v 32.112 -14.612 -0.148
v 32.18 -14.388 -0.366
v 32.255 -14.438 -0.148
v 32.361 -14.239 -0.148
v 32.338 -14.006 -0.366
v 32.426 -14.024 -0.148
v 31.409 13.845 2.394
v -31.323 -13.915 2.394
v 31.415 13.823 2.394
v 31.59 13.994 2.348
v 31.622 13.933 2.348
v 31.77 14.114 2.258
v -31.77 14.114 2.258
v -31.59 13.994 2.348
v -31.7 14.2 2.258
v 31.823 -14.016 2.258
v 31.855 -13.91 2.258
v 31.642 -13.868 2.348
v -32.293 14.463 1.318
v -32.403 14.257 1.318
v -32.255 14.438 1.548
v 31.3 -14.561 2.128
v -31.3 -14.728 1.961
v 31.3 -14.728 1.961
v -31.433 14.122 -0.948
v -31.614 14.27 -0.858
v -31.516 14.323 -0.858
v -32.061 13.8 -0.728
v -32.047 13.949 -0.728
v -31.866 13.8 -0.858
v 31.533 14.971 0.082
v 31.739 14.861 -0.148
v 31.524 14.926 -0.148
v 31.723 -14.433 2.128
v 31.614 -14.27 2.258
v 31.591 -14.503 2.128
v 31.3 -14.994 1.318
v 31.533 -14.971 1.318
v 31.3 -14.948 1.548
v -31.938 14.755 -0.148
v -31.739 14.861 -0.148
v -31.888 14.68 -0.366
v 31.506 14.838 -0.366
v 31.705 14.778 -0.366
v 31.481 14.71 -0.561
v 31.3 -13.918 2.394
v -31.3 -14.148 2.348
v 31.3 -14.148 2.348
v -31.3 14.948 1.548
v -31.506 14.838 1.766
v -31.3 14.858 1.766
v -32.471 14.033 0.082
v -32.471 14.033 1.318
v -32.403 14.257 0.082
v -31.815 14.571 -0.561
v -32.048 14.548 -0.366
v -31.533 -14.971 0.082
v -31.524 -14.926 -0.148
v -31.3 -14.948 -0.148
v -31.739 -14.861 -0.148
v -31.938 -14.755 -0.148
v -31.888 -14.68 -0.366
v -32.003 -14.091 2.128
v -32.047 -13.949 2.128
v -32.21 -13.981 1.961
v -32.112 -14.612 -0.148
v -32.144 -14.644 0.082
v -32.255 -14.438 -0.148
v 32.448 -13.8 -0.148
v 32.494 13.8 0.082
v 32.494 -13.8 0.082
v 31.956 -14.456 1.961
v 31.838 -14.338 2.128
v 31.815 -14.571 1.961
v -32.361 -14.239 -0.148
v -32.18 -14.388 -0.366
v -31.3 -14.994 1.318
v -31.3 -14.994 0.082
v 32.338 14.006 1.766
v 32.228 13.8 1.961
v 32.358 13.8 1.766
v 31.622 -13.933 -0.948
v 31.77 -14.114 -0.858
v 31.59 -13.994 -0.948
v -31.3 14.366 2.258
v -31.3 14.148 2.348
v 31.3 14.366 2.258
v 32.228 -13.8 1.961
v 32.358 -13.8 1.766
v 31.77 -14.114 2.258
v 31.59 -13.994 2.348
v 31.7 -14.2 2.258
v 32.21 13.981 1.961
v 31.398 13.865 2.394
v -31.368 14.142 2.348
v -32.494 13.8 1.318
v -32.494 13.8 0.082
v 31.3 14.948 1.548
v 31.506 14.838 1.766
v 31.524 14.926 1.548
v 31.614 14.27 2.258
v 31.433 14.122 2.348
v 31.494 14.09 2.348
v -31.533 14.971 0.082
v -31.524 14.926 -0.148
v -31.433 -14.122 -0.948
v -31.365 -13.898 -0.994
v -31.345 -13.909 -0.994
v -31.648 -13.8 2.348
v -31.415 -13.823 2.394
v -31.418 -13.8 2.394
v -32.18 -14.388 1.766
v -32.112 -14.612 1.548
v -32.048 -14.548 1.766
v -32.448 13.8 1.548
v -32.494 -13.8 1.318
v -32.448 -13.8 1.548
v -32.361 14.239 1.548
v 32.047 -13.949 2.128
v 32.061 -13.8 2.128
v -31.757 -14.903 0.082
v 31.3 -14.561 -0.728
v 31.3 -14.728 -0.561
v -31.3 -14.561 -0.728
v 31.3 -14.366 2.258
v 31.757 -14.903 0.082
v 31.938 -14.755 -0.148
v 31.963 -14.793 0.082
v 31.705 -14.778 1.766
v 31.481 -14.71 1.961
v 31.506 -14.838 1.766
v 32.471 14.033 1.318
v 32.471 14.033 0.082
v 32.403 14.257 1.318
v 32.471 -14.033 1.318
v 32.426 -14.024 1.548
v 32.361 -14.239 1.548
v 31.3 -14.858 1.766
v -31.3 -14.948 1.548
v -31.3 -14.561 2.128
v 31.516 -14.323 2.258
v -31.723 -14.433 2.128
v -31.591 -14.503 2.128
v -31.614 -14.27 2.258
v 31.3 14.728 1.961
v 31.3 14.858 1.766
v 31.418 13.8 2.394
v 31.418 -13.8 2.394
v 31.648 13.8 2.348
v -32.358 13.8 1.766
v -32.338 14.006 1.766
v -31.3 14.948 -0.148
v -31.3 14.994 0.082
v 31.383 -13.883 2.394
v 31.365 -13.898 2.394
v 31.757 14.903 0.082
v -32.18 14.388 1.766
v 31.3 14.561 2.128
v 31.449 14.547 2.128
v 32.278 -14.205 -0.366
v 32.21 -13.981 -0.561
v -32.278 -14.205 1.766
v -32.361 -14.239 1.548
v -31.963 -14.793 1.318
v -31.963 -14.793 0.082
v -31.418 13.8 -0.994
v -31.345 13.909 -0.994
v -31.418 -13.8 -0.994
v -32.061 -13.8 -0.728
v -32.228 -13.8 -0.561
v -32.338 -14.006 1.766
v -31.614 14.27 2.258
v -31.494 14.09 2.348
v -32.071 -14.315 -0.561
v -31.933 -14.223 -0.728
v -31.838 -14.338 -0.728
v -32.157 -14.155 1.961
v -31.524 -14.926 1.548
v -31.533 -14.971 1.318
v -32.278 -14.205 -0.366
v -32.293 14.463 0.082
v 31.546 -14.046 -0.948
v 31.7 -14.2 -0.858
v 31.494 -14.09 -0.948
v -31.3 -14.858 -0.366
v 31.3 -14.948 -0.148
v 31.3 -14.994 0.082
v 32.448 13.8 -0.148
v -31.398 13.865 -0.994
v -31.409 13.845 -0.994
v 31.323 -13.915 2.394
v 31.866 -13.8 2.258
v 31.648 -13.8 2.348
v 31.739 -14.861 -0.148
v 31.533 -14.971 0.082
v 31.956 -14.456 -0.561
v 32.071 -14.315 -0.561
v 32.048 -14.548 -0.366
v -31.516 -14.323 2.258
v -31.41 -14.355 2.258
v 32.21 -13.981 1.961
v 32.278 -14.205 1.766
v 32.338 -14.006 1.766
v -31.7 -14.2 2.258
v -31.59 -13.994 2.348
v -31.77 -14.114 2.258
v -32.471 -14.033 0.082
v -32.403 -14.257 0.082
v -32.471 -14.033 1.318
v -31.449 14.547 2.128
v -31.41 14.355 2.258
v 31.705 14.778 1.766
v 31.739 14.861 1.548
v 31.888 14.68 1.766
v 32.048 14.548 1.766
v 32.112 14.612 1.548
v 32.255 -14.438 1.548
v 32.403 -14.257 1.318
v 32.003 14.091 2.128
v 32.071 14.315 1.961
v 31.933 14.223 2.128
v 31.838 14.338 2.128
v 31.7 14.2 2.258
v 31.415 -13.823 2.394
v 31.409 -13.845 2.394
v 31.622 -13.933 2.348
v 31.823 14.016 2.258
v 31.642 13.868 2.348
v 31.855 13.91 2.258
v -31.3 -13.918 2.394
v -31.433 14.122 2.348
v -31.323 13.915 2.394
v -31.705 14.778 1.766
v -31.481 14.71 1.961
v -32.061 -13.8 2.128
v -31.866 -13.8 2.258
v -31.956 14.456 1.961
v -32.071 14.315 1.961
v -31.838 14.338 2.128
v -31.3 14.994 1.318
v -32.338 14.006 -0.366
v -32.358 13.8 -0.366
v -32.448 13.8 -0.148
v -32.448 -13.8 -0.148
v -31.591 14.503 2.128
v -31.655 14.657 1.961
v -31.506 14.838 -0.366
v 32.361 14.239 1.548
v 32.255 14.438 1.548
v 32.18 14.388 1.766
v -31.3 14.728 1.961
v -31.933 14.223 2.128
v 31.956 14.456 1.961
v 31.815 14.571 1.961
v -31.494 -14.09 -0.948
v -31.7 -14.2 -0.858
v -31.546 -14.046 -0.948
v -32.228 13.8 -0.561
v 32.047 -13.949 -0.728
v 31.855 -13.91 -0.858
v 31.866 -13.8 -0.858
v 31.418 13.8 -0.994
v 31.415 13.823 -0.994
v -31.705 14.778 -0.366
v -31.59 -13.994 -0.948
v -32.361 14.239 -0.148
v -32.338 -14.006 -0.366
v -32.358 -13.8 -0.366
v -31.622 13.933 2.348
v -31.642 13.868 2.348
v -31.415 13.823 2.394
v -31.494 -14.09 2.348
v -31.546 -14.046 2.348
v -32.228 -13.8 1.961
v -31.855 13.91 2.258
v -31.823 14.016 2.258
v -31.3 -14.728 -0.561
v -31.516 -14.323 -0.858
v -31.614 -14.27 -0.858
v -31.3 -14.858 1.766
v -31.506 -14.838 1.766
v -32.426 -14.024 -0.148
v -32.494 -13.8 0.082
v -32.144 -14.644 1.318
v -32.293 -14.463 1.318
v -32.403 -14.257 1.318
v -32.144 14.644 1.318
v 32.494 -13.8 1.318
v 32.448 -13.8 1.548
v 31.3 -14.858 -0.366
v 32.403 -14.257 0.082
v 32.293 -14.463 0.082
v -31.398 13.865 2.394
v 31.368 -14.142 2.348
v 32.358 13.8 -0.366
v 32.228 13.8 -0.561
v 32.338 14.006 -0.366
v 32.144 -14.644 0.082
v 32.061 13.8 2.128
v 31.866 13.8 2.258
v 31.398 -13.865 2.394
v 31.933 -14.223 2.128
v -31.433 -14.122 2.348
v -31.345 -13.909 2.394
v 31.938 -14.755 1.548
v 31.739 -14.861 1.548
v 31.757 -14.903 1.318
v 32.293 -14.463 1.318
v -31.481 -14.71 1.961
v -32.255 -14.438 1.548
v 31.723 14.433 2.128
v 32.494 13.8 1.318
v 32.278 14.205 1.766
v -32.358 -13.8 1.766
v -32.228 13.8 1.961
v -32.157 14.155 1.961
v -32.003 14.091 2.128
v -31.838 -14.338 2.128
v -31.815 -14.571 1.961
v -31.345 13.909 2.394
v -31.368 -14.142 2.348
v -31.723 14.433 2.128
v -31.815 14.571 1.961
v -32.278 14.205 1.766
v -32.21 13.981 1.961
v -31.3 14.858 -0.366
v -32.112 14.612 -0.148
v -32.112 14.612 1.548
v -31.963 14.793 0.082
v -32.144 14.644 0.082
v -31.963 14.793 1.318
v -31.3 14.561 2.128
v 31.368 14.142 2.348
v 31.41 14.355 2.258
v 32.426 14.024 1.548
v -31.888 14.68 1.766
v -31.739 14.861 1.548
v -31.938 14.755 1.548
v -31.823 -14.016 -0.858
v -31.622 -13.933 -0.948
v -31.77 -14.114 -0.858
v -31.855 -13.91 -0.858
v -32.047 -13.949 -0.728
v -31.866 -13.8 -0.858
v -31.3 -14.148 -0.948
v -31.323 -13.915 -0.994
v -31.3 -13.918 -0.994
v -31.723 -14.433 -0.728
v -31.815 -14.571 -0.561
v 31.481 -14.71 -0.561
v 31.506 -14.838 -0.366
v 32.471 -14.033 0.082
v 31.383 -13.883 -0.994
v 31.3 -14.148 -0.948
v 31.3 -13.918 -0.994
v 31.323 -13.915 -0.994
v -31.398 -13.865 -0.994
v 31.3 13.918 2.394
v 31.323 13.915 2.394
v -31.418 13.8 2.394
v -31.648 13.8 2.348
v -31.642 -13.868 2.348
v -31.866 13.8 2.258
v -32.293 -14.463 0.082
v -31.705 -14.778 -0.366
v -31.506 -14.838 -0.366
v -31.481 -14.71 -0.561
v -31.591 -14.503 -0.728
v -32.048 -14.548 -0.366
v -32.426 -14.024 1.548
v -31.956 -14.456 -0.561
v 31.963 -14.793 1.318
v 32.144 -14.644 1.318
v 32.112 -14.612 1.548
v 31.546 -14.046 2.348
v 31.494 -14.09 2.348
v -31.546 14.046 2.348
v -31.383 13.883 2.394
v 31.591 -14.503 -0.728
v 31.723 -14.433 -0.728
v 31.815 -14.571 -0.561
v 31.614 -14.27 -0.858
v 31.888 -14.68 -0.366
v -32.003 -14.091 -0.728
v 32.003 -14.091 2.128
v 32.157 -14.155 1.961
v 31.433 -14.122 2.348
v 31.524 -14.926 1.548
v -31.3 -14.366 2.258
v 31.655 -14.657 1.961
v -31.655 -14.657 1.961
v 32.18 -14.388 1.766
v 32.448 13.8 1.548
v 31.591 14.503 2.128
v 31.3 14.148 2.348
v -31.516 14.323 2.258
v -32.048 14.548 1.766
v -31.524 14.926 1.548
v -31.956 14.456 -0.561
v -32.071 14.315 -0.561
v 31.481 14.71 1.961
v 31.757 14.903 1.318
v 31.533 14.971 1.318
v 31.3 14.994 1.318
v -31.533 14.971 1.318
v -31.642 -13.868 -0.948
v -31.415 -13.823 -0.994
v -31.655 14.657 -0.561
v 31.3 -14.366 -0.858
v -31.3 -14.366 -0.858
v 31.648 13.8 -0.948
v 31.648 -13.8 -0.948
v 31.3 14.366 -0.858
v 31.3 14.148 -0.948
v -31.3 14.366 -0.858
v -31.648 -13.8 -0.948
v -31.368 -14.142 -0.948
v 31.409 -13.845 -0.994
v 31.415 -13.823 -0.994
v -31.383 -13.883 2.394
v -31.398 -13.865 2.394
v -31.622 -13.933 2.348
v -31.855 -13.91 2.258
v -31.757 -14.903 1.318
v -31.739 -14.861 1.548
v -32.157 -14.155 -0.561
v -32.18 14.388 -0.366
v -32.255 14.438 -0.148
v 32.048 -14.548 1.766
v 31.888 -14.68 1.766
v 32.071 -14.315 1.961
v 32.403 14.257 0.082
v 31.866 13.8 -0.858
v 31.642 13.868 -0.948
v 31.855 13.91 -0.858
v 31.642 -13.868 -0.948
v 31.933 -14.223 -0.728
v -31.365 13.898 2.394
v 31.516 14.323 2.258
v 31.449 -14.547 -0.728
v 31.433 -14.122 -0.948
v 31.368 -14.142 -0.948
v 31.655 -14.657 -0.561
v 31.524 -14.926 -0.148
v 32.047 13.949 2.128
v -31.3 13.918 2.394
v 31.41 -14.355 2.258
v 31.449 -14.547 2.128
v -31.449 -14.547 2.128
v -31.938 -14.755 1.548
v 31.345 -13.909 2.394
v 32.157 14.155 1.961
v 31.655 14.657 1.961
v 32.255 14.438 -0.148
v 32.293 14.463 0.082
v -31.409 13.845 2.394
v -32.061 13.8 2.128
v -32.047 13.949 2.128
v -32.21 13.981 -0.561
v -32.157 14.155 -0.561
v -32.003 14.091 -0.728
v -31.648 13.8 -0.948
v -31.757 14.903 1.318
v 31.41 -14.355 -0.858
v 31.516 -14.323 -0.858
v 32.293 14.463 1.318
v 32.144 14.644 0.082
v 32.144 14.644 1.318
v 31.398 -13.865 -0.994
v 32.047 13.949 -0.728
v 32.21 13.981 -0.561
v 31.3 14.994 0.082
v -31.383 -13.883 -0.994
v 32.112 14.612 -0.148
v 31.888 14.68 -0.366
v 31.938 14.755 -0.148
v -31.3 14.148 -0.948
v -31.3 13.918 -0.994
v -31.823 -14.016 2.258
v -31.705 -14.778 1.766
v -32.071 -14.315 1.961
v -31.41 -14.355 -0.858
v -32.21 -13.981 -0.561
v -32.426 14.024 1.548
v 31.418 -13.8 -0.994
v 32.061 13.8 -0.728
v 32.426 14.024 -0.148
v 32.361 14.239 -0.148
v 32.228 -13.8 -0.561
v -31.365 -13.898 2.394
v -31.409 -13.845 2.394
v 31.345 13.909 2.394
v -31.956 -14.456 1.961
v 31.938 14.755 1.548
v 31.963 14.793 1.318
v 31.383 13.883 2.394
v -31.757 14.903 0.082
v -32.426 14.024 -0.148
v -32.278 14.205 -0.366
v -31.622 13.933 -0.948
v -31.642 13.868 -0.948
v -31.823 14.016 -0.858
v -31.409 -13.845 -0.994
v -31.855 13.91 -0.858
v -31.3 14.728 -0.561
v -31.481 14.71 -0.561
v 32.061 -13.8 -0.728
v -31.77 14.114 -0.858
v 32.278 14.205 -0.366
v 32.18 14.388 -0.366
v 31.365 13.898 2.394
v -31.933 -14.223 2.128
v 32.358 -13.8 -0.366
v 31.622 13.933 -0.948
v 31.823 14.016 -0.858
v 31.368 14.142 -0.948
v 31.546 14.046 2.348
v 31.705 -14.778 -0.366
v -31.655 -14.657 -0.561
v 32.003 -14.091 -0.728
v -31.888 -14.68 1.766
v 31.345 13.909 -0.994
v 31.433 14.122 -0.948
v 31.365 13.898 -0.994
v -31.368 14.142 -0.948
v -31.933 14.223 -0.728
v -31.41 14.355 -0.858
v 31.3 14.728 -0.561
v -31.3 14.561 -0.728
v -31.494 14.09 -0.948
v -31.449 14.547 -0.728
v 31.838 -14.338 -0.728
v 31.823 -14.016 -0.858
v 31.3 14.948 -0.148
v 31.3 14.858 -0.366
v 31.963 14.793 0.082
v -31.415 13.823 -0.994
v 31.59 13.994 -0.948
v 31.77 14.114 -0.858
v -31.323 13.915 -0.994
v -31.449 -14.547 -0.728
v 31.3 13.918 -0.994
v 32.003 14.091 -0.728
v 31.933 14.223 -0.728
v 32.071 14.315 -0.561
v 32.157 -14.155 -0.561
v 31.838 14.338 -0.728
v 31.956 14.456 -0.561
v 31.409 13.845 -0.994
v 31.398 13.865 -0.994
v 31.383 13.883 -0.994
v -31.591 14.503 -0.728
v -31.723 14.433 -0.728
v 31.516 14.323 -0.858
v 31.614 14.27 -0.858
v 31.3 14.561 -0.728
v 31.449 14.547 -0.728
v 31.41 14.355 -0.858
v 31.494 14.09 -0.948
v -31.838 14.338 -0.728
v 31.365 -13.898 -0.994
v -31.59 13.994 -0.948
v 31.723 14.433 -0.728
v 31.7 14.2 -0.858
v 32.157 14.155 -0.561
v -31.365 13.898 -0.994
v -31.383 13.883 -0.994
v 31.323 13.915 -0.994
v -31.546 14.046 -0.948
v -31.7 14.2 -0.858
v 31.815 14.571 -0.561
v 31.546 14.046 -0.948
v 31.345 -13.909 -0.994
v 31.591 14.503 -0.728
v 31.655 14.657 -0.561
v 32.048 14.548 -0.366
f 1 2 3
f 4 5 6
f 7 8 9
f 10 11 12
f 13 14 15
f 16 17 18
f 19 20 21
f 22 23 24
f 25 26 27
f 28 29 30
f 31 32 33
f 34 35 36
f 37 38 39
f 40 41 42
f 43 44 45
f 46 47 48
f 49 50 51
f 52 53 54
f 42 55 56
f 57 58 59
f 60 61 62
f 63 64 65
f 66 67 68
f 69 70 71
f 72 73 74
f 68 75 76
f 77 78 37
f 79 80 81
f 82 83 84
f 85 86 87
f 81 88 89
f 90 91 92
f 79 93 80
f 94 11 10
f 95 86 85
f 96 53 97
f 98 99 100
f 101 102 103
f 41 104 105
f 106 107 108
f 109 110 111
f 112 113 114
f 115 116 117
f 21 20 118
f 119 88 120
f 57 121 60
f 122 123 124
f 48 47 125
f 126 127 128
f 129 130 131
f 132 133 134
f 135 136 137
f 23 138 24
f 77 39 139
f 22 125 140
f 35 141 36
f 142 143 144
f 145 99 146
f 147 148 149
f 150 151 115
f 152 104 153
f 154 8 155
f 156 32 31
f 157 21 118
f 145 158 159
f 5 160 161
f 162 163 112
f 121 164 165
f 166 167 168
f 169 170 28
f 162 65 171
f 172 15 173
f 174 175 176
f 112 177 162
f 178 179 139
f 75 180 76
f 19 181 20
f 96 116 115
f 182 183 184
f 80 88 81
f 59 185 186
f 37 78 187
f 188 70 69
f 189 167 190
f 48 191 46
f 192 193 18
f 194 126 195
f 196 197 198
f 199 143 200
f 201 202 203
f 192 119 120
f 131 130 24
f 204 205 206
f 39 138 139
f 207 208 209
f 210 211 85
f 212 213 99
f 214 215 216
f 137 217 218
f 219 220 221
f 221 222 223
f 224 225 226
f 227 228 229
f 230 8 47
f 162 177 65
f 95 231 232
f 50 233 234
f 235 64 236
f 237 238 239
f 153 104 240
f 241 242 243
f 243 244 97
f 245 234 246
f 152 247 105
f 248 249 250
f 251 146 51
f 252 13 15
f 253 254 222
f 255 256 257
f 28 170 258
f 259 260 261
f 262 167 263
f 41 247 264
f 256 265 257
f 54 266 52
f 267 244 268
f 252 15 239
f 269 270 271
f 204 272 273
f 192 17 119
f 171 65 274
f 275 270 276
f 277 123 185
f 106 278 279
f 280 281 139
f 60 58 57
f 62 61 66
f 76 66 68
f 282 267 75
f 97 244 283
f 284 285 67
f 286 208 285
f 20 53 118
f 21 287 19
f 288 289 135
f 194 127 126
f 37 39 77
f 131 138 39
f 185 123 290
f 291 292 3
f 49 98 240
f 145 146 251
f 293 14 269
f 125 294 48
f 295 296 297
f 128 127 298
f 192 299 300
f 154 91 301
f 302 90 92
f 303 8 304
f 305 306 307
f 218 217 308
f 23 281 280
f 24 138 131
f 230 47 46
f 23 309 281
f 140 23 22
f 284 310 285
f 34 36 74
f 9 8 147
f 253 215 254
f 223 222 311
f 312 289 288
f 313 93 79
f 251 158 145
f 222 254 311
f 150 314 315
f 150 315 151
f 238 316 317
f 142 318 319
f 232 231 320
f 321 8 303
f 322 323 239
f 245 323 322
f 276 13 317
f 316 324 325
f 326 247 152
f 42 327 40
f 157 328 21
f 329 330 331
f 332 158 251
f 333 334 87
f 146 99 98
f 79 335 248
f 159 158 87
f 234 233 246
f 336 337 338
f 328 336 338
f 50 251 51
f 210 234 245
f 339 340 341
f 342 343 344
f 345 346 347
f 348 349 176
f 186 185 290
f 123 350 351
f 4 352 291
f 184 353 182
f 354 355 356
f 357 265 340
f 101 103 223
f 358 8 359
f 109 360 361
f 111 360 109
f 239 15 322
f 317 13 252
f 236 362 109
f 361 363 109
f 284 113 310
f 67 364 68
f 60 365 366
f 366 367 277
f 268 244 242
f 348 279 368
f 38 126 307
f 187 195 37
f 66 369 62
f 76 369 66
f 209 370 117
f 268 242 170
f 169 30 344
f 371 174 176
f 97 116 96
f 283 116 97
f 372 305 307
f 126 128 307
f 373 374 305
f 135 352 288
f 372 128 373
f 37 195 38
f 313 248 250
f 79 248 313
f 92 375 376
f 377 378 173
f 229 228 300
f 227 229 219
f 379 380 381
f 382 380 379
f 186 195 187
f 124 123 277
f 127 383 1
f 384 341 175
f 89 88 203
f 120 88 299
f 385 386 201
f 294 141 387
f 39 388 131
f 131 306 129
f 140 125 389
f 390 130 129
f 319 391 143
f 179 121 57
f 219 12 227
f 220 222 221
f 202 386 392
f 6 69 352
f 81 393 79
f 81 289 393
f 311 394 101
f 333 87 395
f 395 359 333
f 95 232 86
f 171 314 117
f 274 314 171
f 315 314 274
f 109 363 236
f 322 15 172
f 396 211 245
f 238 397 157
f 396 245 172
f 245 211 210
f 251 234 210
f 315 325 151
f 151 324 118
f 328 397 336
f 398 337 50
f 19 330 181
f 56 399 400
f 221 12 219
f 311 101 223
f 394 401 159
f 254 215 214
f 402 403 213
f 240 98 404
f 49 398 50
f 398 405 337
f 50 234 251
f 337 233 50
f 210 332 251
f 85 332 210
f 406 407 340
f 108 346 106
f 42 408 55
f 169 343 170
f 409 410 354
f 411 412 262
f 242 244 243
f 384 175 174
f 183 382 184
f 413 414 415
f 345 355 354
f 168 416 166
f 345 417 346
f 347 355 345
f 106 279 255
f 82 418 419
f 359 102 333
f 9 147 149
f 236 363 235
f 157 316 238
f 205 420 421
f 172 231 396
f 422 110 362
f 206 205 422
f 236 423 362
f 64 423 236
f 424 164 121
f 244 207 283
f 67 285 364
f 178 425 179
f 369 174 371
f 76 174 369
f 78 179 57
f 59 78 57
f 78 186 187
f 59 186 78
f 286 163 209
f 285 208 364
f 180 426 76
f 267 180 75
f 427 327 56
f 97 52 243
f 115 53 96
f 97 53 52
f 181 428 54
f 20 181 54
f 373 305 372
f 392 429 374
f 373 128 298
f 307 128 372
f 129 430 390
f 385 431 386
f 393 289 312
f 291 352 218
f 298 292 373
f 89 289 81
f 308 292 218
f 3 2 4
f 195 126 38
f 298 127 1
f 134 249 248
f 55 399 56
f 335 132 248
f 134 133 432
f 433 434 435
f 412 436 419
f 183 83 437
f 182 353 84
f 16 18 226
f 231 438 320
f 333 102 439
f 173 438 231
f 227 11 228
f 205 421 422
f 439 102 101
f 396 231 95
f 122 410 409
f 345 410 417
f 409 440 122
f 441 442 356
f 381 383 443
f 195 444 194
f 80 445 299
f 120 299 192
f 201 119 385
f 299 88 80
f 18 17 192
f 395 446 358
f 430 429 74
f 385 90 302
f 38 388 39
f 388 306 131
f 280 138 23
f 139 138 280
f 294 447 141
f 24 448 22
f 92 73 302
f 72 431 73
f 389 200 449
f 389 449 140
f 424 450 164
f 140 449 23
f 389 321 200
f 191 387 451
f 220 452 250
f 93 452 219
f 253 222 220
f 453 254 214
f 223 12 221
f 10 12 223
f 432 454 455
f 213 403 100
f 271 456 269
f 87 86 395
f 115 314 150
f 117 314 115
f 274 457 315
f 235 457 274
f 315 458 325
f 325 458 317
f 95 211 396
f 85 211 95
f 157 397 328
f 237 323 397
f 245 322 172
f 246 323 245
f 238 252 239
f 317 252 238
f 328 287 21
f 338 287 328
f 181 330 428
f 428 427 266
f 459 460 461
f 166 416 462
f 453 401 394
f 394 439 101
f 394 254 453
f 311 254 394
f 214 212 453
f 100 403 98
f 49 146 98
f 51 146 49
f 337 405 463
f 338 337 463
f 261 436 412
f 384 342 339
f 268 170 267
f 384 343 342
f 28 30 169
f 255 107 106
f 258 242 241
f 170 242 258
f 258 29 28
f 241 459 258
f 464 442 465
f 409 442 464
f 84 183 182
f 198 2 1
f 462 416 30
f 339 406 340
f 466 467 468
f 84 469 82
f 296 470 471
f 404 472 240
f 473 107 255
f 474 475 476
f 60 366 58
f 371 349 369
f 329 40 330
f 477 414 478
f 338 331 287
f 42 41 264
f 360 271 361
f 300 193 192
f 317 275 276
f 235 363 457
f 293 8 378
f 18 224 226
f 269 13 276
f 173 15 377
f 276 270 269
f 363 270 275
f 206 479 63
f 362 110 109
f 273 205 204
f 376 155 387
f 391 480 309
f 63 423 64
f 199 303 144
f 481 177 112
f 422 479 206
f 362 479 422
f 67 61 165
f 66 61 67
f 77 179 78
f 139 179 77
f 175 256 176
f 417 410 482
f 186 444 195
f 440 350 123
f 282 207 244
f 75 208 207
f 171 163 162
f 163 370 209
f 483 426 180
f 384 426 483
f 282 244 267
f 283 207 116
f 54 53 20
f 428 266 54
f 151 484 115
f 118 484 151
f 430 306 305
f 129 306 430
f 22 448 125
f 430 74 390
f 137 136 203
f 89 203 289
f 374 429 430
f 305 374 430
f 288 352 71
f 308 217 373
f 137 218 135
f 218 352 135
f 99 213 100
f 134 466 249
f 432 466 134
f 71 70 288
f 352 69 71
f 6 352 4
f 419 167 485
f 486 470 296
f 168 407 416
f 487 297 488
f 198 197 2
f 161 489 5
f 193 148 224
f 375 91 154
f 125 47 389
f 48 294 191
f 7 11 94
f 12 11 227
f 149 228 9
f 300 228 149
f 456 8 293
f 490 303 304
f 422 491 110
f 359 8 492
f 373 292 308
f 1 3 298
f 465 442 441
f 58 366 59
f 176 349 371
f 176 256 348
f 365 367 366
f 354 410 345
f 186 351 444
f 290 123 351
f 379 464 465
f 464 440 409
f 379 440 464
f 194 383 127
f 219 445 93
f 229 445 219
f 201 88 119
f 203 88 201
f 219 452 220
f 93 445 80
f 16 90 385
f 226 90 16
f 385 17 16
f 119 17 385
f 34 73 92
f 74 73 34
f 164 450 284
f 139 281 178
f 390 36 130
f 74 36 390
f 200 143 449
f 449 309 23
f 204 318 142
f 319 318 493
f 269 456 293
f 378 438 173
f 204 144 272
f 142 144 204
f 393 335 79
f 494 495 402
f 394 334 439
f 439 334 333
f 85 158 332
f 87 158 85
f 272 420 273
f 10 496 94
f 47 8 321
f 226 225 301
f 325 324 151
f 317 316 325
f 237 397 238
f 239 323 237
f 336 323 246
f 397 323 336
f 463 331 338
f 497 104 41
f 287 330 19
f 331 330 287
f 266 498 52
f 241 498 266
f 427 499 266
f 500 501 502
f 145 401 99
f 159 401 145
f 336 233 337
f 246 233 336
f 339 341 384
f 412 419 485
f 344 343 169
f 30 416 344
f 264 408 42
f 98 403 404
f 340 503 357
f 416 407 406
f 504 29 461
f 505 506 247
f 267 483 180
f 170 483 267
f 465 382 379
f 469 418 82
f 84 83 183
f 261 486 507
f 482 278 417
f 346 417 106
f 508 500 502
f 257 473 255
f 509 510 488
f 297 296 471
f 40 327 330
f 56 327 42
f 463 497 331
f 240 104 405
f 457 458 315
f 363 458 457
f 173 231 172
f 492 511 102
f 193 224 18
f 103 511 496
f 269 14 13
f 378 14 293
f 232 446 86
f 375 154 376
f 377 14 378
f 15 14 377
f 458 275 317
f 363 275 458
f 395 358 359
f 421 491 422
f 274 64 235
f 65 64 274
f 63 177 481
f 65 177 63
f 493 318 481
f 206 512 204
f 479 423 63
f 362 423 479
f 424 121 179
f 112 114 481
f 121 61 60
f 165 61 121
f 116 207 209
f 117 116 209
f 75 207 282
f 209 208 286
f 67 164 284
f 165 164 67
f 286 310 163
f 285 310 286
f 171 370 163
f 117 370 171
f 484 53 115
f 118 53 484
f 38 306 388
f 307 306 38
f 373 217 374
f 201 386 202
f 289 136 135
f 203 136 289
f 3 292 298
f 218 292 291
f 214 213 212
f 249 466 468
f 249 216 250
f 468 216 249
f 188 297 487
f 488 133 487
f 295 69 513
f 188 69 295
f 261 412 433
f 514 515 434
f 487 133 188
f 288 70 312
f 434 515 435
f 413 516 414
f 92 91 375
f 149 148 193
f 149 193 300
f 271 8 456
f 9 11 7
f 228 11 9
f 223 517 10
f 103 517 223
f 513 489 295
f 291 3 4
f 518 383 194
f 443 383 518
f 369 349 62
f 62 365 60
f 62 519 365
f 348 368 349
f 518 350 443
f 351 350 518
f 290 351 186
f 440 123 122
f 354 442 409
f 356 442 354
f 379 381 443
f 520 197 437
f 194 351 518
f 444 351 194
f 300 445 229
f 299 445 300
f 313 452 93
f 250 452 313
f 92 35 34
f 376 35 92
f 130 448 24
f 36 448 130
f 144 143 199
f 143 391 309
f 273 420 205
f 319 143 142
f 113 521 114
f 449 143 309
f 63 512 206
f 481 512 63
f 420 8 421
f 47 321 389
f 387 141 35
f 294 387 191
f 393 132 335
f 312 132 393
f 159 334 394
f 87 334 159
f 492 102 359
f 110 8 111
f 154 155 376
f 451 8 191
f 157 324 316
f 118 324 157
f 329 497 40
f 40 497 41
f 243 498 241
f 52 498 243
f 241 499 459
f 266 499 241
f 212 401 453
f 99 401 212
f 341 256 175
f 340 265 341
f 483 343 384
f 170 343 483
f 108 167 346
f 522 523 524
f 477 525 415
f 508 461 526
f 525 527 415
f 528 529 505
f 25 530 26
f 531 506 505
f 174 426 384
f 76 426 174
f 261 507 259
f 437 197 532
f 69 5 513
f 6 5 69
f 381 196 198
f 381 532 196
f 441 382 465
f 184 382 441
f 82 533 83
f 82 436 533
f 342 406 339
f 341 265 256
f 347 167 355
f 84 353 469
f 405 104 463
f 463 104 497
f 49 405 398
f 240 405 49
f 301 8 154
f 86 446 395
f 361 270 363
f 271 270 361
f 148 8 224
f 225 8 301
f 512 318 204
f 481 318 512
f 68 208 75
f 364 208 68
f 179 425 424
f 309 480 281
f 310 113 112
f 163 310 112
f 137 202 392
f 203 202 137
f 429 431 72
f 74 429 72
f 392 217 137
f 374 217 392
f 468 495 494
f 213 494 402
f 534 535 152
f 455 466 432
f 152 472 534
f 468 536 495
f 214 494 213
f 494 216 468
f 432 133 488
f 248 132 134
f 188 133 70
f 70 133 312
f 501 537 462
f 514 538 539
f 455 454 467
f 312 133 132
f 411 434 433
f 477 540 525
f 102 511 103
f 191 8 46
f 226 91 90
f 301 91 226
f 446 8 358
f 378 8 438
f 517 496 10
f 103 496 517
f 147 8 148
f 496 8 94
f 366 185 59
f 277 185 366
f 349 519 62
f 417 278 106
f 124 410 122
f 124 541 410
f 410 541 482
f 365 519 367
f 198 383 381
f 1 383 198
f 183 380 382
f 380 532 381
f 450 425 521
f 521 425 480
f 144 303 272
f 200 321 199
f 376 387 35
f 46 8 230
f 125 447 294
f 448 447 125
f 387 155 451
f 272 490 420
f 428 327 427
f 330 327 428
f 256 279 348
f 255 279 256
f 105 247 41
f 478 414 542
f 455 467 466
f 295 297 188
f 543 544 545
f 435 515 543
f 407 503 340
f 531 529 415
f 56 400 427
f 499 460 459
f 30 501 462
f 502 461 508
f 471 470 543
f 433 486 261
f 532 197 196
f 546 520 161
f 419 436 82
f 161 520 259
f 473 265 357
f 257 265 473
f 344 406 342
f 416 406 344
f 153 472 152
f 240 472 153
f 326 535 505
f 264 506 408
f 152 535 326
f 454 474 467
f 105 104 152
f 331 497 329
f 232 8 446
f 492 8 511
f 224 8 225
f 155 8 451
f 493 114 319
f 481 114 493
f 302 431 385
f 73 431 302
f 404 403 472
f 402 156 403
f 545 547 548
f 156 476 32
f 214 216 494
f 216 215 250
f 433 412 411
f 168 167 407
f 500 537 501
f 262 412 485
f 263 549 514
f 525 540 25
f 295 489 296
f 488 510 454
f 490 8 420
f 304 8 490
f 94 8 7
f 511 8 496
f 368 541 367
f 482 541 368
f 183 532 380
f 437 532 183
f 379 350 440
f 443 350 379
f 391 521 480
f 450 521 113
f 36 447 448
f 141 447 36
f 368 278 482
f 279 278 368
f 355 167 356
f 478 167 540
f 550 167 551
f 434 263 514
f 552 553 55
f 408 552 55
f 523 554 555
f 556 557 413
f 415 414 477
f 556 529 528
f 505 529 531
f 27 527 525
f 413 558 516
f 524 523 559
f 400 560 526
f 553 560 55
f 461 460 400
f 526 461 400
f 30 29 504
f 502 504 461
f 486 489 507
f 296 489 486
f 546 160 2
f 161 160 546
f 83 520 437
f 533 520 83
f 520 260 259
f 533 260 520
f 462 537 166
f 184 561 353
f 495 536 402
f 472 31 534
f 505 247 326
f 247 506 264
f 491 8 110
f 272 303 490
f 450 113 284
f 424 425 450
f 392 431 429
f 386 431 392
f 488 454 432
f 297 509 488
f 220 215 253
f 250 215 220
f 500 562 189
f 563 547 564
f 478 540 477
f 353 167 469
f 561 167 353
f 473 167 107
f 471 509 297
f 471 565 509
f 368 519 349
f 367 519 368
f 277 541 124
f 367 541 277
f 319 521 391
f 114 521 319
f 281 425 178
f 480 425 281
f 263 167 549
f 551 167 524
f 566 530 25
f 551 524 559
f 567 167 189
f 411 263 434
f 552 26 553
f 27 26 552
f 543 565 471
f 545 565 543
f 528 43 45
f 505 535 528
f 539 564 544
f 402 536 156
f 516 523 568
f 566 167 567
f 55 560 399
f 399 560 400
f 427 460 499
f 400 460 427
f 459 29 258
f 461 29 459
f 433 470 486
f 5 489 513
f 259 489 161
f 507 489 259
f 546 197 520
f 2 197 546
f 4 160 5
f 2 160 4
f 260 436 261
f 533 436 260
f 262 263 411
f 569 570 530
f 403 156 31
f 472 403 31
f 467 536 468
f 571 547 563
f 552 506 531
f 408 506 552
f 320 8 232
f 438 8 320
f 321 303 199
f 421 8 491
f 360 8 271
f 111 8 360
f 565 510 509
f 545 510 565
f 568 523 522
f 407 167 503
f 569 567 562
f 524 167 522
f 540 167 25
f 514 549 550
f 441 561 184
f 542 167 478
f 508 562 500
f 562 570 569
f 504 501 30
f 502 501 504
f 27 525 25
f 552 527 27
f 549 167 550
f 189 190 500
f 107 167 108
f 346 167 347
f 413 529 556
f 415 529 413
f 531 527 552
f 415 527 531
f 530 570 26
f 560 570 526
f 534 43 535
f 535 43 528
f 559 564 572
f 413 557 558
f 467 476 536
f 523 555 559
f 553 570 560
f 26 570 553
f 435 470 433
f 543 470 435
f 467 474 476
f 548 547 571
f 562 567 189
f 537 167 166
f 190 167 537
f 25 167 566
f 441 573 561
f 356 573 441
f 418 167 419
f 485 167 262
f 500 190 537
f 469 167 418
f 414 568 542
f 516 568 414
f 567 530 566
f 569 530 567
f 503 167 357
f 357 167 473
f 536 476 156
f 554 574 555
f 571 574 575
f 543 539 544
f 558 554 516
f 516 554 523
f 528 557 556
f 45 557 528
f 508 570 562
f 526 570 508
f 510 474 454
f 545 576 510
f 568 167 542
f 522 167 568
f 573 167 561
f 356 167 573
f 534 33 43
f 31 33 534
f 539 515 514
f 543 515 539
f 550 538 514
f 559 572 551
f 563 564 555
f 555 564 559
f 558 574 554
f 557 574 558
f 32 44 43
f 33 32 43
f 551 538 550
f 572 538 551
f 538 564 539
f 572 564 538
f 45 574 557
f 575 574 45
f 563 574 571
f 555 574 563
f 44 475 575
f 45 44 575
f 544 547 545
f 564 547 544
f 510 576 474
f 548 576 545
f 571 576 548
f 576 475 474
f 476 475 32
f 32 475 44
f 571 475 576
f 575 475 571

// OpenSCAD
// Raspberry Pi Zero 2 W (Raspberry Pi Zero 2 W) visual source for NexCAD.
// Units: millimeters. Origin: part bottom-center, matching src/parts/library.ts.
// This generated baseline is intentionally simple; refine it with measured details before exporting STL.

$fn = 32;

module rounded_box(size, r = 0.8) {
  hull() {
    for (x = [-size[0] / 2 + r, size[0] / 2 - r])
      for (y = [-size[1] / 2 + r, size[1] / 2 - r]) {
        translate([x, y, r]) sphere(r = r);
        translate([x, y, size[2] - r]) sphere(r = r);
      }
  }
}

color("#2e7d5b") rounded_box([65, 30, 1.4], min(1.2, min(65, 30) / 8));
